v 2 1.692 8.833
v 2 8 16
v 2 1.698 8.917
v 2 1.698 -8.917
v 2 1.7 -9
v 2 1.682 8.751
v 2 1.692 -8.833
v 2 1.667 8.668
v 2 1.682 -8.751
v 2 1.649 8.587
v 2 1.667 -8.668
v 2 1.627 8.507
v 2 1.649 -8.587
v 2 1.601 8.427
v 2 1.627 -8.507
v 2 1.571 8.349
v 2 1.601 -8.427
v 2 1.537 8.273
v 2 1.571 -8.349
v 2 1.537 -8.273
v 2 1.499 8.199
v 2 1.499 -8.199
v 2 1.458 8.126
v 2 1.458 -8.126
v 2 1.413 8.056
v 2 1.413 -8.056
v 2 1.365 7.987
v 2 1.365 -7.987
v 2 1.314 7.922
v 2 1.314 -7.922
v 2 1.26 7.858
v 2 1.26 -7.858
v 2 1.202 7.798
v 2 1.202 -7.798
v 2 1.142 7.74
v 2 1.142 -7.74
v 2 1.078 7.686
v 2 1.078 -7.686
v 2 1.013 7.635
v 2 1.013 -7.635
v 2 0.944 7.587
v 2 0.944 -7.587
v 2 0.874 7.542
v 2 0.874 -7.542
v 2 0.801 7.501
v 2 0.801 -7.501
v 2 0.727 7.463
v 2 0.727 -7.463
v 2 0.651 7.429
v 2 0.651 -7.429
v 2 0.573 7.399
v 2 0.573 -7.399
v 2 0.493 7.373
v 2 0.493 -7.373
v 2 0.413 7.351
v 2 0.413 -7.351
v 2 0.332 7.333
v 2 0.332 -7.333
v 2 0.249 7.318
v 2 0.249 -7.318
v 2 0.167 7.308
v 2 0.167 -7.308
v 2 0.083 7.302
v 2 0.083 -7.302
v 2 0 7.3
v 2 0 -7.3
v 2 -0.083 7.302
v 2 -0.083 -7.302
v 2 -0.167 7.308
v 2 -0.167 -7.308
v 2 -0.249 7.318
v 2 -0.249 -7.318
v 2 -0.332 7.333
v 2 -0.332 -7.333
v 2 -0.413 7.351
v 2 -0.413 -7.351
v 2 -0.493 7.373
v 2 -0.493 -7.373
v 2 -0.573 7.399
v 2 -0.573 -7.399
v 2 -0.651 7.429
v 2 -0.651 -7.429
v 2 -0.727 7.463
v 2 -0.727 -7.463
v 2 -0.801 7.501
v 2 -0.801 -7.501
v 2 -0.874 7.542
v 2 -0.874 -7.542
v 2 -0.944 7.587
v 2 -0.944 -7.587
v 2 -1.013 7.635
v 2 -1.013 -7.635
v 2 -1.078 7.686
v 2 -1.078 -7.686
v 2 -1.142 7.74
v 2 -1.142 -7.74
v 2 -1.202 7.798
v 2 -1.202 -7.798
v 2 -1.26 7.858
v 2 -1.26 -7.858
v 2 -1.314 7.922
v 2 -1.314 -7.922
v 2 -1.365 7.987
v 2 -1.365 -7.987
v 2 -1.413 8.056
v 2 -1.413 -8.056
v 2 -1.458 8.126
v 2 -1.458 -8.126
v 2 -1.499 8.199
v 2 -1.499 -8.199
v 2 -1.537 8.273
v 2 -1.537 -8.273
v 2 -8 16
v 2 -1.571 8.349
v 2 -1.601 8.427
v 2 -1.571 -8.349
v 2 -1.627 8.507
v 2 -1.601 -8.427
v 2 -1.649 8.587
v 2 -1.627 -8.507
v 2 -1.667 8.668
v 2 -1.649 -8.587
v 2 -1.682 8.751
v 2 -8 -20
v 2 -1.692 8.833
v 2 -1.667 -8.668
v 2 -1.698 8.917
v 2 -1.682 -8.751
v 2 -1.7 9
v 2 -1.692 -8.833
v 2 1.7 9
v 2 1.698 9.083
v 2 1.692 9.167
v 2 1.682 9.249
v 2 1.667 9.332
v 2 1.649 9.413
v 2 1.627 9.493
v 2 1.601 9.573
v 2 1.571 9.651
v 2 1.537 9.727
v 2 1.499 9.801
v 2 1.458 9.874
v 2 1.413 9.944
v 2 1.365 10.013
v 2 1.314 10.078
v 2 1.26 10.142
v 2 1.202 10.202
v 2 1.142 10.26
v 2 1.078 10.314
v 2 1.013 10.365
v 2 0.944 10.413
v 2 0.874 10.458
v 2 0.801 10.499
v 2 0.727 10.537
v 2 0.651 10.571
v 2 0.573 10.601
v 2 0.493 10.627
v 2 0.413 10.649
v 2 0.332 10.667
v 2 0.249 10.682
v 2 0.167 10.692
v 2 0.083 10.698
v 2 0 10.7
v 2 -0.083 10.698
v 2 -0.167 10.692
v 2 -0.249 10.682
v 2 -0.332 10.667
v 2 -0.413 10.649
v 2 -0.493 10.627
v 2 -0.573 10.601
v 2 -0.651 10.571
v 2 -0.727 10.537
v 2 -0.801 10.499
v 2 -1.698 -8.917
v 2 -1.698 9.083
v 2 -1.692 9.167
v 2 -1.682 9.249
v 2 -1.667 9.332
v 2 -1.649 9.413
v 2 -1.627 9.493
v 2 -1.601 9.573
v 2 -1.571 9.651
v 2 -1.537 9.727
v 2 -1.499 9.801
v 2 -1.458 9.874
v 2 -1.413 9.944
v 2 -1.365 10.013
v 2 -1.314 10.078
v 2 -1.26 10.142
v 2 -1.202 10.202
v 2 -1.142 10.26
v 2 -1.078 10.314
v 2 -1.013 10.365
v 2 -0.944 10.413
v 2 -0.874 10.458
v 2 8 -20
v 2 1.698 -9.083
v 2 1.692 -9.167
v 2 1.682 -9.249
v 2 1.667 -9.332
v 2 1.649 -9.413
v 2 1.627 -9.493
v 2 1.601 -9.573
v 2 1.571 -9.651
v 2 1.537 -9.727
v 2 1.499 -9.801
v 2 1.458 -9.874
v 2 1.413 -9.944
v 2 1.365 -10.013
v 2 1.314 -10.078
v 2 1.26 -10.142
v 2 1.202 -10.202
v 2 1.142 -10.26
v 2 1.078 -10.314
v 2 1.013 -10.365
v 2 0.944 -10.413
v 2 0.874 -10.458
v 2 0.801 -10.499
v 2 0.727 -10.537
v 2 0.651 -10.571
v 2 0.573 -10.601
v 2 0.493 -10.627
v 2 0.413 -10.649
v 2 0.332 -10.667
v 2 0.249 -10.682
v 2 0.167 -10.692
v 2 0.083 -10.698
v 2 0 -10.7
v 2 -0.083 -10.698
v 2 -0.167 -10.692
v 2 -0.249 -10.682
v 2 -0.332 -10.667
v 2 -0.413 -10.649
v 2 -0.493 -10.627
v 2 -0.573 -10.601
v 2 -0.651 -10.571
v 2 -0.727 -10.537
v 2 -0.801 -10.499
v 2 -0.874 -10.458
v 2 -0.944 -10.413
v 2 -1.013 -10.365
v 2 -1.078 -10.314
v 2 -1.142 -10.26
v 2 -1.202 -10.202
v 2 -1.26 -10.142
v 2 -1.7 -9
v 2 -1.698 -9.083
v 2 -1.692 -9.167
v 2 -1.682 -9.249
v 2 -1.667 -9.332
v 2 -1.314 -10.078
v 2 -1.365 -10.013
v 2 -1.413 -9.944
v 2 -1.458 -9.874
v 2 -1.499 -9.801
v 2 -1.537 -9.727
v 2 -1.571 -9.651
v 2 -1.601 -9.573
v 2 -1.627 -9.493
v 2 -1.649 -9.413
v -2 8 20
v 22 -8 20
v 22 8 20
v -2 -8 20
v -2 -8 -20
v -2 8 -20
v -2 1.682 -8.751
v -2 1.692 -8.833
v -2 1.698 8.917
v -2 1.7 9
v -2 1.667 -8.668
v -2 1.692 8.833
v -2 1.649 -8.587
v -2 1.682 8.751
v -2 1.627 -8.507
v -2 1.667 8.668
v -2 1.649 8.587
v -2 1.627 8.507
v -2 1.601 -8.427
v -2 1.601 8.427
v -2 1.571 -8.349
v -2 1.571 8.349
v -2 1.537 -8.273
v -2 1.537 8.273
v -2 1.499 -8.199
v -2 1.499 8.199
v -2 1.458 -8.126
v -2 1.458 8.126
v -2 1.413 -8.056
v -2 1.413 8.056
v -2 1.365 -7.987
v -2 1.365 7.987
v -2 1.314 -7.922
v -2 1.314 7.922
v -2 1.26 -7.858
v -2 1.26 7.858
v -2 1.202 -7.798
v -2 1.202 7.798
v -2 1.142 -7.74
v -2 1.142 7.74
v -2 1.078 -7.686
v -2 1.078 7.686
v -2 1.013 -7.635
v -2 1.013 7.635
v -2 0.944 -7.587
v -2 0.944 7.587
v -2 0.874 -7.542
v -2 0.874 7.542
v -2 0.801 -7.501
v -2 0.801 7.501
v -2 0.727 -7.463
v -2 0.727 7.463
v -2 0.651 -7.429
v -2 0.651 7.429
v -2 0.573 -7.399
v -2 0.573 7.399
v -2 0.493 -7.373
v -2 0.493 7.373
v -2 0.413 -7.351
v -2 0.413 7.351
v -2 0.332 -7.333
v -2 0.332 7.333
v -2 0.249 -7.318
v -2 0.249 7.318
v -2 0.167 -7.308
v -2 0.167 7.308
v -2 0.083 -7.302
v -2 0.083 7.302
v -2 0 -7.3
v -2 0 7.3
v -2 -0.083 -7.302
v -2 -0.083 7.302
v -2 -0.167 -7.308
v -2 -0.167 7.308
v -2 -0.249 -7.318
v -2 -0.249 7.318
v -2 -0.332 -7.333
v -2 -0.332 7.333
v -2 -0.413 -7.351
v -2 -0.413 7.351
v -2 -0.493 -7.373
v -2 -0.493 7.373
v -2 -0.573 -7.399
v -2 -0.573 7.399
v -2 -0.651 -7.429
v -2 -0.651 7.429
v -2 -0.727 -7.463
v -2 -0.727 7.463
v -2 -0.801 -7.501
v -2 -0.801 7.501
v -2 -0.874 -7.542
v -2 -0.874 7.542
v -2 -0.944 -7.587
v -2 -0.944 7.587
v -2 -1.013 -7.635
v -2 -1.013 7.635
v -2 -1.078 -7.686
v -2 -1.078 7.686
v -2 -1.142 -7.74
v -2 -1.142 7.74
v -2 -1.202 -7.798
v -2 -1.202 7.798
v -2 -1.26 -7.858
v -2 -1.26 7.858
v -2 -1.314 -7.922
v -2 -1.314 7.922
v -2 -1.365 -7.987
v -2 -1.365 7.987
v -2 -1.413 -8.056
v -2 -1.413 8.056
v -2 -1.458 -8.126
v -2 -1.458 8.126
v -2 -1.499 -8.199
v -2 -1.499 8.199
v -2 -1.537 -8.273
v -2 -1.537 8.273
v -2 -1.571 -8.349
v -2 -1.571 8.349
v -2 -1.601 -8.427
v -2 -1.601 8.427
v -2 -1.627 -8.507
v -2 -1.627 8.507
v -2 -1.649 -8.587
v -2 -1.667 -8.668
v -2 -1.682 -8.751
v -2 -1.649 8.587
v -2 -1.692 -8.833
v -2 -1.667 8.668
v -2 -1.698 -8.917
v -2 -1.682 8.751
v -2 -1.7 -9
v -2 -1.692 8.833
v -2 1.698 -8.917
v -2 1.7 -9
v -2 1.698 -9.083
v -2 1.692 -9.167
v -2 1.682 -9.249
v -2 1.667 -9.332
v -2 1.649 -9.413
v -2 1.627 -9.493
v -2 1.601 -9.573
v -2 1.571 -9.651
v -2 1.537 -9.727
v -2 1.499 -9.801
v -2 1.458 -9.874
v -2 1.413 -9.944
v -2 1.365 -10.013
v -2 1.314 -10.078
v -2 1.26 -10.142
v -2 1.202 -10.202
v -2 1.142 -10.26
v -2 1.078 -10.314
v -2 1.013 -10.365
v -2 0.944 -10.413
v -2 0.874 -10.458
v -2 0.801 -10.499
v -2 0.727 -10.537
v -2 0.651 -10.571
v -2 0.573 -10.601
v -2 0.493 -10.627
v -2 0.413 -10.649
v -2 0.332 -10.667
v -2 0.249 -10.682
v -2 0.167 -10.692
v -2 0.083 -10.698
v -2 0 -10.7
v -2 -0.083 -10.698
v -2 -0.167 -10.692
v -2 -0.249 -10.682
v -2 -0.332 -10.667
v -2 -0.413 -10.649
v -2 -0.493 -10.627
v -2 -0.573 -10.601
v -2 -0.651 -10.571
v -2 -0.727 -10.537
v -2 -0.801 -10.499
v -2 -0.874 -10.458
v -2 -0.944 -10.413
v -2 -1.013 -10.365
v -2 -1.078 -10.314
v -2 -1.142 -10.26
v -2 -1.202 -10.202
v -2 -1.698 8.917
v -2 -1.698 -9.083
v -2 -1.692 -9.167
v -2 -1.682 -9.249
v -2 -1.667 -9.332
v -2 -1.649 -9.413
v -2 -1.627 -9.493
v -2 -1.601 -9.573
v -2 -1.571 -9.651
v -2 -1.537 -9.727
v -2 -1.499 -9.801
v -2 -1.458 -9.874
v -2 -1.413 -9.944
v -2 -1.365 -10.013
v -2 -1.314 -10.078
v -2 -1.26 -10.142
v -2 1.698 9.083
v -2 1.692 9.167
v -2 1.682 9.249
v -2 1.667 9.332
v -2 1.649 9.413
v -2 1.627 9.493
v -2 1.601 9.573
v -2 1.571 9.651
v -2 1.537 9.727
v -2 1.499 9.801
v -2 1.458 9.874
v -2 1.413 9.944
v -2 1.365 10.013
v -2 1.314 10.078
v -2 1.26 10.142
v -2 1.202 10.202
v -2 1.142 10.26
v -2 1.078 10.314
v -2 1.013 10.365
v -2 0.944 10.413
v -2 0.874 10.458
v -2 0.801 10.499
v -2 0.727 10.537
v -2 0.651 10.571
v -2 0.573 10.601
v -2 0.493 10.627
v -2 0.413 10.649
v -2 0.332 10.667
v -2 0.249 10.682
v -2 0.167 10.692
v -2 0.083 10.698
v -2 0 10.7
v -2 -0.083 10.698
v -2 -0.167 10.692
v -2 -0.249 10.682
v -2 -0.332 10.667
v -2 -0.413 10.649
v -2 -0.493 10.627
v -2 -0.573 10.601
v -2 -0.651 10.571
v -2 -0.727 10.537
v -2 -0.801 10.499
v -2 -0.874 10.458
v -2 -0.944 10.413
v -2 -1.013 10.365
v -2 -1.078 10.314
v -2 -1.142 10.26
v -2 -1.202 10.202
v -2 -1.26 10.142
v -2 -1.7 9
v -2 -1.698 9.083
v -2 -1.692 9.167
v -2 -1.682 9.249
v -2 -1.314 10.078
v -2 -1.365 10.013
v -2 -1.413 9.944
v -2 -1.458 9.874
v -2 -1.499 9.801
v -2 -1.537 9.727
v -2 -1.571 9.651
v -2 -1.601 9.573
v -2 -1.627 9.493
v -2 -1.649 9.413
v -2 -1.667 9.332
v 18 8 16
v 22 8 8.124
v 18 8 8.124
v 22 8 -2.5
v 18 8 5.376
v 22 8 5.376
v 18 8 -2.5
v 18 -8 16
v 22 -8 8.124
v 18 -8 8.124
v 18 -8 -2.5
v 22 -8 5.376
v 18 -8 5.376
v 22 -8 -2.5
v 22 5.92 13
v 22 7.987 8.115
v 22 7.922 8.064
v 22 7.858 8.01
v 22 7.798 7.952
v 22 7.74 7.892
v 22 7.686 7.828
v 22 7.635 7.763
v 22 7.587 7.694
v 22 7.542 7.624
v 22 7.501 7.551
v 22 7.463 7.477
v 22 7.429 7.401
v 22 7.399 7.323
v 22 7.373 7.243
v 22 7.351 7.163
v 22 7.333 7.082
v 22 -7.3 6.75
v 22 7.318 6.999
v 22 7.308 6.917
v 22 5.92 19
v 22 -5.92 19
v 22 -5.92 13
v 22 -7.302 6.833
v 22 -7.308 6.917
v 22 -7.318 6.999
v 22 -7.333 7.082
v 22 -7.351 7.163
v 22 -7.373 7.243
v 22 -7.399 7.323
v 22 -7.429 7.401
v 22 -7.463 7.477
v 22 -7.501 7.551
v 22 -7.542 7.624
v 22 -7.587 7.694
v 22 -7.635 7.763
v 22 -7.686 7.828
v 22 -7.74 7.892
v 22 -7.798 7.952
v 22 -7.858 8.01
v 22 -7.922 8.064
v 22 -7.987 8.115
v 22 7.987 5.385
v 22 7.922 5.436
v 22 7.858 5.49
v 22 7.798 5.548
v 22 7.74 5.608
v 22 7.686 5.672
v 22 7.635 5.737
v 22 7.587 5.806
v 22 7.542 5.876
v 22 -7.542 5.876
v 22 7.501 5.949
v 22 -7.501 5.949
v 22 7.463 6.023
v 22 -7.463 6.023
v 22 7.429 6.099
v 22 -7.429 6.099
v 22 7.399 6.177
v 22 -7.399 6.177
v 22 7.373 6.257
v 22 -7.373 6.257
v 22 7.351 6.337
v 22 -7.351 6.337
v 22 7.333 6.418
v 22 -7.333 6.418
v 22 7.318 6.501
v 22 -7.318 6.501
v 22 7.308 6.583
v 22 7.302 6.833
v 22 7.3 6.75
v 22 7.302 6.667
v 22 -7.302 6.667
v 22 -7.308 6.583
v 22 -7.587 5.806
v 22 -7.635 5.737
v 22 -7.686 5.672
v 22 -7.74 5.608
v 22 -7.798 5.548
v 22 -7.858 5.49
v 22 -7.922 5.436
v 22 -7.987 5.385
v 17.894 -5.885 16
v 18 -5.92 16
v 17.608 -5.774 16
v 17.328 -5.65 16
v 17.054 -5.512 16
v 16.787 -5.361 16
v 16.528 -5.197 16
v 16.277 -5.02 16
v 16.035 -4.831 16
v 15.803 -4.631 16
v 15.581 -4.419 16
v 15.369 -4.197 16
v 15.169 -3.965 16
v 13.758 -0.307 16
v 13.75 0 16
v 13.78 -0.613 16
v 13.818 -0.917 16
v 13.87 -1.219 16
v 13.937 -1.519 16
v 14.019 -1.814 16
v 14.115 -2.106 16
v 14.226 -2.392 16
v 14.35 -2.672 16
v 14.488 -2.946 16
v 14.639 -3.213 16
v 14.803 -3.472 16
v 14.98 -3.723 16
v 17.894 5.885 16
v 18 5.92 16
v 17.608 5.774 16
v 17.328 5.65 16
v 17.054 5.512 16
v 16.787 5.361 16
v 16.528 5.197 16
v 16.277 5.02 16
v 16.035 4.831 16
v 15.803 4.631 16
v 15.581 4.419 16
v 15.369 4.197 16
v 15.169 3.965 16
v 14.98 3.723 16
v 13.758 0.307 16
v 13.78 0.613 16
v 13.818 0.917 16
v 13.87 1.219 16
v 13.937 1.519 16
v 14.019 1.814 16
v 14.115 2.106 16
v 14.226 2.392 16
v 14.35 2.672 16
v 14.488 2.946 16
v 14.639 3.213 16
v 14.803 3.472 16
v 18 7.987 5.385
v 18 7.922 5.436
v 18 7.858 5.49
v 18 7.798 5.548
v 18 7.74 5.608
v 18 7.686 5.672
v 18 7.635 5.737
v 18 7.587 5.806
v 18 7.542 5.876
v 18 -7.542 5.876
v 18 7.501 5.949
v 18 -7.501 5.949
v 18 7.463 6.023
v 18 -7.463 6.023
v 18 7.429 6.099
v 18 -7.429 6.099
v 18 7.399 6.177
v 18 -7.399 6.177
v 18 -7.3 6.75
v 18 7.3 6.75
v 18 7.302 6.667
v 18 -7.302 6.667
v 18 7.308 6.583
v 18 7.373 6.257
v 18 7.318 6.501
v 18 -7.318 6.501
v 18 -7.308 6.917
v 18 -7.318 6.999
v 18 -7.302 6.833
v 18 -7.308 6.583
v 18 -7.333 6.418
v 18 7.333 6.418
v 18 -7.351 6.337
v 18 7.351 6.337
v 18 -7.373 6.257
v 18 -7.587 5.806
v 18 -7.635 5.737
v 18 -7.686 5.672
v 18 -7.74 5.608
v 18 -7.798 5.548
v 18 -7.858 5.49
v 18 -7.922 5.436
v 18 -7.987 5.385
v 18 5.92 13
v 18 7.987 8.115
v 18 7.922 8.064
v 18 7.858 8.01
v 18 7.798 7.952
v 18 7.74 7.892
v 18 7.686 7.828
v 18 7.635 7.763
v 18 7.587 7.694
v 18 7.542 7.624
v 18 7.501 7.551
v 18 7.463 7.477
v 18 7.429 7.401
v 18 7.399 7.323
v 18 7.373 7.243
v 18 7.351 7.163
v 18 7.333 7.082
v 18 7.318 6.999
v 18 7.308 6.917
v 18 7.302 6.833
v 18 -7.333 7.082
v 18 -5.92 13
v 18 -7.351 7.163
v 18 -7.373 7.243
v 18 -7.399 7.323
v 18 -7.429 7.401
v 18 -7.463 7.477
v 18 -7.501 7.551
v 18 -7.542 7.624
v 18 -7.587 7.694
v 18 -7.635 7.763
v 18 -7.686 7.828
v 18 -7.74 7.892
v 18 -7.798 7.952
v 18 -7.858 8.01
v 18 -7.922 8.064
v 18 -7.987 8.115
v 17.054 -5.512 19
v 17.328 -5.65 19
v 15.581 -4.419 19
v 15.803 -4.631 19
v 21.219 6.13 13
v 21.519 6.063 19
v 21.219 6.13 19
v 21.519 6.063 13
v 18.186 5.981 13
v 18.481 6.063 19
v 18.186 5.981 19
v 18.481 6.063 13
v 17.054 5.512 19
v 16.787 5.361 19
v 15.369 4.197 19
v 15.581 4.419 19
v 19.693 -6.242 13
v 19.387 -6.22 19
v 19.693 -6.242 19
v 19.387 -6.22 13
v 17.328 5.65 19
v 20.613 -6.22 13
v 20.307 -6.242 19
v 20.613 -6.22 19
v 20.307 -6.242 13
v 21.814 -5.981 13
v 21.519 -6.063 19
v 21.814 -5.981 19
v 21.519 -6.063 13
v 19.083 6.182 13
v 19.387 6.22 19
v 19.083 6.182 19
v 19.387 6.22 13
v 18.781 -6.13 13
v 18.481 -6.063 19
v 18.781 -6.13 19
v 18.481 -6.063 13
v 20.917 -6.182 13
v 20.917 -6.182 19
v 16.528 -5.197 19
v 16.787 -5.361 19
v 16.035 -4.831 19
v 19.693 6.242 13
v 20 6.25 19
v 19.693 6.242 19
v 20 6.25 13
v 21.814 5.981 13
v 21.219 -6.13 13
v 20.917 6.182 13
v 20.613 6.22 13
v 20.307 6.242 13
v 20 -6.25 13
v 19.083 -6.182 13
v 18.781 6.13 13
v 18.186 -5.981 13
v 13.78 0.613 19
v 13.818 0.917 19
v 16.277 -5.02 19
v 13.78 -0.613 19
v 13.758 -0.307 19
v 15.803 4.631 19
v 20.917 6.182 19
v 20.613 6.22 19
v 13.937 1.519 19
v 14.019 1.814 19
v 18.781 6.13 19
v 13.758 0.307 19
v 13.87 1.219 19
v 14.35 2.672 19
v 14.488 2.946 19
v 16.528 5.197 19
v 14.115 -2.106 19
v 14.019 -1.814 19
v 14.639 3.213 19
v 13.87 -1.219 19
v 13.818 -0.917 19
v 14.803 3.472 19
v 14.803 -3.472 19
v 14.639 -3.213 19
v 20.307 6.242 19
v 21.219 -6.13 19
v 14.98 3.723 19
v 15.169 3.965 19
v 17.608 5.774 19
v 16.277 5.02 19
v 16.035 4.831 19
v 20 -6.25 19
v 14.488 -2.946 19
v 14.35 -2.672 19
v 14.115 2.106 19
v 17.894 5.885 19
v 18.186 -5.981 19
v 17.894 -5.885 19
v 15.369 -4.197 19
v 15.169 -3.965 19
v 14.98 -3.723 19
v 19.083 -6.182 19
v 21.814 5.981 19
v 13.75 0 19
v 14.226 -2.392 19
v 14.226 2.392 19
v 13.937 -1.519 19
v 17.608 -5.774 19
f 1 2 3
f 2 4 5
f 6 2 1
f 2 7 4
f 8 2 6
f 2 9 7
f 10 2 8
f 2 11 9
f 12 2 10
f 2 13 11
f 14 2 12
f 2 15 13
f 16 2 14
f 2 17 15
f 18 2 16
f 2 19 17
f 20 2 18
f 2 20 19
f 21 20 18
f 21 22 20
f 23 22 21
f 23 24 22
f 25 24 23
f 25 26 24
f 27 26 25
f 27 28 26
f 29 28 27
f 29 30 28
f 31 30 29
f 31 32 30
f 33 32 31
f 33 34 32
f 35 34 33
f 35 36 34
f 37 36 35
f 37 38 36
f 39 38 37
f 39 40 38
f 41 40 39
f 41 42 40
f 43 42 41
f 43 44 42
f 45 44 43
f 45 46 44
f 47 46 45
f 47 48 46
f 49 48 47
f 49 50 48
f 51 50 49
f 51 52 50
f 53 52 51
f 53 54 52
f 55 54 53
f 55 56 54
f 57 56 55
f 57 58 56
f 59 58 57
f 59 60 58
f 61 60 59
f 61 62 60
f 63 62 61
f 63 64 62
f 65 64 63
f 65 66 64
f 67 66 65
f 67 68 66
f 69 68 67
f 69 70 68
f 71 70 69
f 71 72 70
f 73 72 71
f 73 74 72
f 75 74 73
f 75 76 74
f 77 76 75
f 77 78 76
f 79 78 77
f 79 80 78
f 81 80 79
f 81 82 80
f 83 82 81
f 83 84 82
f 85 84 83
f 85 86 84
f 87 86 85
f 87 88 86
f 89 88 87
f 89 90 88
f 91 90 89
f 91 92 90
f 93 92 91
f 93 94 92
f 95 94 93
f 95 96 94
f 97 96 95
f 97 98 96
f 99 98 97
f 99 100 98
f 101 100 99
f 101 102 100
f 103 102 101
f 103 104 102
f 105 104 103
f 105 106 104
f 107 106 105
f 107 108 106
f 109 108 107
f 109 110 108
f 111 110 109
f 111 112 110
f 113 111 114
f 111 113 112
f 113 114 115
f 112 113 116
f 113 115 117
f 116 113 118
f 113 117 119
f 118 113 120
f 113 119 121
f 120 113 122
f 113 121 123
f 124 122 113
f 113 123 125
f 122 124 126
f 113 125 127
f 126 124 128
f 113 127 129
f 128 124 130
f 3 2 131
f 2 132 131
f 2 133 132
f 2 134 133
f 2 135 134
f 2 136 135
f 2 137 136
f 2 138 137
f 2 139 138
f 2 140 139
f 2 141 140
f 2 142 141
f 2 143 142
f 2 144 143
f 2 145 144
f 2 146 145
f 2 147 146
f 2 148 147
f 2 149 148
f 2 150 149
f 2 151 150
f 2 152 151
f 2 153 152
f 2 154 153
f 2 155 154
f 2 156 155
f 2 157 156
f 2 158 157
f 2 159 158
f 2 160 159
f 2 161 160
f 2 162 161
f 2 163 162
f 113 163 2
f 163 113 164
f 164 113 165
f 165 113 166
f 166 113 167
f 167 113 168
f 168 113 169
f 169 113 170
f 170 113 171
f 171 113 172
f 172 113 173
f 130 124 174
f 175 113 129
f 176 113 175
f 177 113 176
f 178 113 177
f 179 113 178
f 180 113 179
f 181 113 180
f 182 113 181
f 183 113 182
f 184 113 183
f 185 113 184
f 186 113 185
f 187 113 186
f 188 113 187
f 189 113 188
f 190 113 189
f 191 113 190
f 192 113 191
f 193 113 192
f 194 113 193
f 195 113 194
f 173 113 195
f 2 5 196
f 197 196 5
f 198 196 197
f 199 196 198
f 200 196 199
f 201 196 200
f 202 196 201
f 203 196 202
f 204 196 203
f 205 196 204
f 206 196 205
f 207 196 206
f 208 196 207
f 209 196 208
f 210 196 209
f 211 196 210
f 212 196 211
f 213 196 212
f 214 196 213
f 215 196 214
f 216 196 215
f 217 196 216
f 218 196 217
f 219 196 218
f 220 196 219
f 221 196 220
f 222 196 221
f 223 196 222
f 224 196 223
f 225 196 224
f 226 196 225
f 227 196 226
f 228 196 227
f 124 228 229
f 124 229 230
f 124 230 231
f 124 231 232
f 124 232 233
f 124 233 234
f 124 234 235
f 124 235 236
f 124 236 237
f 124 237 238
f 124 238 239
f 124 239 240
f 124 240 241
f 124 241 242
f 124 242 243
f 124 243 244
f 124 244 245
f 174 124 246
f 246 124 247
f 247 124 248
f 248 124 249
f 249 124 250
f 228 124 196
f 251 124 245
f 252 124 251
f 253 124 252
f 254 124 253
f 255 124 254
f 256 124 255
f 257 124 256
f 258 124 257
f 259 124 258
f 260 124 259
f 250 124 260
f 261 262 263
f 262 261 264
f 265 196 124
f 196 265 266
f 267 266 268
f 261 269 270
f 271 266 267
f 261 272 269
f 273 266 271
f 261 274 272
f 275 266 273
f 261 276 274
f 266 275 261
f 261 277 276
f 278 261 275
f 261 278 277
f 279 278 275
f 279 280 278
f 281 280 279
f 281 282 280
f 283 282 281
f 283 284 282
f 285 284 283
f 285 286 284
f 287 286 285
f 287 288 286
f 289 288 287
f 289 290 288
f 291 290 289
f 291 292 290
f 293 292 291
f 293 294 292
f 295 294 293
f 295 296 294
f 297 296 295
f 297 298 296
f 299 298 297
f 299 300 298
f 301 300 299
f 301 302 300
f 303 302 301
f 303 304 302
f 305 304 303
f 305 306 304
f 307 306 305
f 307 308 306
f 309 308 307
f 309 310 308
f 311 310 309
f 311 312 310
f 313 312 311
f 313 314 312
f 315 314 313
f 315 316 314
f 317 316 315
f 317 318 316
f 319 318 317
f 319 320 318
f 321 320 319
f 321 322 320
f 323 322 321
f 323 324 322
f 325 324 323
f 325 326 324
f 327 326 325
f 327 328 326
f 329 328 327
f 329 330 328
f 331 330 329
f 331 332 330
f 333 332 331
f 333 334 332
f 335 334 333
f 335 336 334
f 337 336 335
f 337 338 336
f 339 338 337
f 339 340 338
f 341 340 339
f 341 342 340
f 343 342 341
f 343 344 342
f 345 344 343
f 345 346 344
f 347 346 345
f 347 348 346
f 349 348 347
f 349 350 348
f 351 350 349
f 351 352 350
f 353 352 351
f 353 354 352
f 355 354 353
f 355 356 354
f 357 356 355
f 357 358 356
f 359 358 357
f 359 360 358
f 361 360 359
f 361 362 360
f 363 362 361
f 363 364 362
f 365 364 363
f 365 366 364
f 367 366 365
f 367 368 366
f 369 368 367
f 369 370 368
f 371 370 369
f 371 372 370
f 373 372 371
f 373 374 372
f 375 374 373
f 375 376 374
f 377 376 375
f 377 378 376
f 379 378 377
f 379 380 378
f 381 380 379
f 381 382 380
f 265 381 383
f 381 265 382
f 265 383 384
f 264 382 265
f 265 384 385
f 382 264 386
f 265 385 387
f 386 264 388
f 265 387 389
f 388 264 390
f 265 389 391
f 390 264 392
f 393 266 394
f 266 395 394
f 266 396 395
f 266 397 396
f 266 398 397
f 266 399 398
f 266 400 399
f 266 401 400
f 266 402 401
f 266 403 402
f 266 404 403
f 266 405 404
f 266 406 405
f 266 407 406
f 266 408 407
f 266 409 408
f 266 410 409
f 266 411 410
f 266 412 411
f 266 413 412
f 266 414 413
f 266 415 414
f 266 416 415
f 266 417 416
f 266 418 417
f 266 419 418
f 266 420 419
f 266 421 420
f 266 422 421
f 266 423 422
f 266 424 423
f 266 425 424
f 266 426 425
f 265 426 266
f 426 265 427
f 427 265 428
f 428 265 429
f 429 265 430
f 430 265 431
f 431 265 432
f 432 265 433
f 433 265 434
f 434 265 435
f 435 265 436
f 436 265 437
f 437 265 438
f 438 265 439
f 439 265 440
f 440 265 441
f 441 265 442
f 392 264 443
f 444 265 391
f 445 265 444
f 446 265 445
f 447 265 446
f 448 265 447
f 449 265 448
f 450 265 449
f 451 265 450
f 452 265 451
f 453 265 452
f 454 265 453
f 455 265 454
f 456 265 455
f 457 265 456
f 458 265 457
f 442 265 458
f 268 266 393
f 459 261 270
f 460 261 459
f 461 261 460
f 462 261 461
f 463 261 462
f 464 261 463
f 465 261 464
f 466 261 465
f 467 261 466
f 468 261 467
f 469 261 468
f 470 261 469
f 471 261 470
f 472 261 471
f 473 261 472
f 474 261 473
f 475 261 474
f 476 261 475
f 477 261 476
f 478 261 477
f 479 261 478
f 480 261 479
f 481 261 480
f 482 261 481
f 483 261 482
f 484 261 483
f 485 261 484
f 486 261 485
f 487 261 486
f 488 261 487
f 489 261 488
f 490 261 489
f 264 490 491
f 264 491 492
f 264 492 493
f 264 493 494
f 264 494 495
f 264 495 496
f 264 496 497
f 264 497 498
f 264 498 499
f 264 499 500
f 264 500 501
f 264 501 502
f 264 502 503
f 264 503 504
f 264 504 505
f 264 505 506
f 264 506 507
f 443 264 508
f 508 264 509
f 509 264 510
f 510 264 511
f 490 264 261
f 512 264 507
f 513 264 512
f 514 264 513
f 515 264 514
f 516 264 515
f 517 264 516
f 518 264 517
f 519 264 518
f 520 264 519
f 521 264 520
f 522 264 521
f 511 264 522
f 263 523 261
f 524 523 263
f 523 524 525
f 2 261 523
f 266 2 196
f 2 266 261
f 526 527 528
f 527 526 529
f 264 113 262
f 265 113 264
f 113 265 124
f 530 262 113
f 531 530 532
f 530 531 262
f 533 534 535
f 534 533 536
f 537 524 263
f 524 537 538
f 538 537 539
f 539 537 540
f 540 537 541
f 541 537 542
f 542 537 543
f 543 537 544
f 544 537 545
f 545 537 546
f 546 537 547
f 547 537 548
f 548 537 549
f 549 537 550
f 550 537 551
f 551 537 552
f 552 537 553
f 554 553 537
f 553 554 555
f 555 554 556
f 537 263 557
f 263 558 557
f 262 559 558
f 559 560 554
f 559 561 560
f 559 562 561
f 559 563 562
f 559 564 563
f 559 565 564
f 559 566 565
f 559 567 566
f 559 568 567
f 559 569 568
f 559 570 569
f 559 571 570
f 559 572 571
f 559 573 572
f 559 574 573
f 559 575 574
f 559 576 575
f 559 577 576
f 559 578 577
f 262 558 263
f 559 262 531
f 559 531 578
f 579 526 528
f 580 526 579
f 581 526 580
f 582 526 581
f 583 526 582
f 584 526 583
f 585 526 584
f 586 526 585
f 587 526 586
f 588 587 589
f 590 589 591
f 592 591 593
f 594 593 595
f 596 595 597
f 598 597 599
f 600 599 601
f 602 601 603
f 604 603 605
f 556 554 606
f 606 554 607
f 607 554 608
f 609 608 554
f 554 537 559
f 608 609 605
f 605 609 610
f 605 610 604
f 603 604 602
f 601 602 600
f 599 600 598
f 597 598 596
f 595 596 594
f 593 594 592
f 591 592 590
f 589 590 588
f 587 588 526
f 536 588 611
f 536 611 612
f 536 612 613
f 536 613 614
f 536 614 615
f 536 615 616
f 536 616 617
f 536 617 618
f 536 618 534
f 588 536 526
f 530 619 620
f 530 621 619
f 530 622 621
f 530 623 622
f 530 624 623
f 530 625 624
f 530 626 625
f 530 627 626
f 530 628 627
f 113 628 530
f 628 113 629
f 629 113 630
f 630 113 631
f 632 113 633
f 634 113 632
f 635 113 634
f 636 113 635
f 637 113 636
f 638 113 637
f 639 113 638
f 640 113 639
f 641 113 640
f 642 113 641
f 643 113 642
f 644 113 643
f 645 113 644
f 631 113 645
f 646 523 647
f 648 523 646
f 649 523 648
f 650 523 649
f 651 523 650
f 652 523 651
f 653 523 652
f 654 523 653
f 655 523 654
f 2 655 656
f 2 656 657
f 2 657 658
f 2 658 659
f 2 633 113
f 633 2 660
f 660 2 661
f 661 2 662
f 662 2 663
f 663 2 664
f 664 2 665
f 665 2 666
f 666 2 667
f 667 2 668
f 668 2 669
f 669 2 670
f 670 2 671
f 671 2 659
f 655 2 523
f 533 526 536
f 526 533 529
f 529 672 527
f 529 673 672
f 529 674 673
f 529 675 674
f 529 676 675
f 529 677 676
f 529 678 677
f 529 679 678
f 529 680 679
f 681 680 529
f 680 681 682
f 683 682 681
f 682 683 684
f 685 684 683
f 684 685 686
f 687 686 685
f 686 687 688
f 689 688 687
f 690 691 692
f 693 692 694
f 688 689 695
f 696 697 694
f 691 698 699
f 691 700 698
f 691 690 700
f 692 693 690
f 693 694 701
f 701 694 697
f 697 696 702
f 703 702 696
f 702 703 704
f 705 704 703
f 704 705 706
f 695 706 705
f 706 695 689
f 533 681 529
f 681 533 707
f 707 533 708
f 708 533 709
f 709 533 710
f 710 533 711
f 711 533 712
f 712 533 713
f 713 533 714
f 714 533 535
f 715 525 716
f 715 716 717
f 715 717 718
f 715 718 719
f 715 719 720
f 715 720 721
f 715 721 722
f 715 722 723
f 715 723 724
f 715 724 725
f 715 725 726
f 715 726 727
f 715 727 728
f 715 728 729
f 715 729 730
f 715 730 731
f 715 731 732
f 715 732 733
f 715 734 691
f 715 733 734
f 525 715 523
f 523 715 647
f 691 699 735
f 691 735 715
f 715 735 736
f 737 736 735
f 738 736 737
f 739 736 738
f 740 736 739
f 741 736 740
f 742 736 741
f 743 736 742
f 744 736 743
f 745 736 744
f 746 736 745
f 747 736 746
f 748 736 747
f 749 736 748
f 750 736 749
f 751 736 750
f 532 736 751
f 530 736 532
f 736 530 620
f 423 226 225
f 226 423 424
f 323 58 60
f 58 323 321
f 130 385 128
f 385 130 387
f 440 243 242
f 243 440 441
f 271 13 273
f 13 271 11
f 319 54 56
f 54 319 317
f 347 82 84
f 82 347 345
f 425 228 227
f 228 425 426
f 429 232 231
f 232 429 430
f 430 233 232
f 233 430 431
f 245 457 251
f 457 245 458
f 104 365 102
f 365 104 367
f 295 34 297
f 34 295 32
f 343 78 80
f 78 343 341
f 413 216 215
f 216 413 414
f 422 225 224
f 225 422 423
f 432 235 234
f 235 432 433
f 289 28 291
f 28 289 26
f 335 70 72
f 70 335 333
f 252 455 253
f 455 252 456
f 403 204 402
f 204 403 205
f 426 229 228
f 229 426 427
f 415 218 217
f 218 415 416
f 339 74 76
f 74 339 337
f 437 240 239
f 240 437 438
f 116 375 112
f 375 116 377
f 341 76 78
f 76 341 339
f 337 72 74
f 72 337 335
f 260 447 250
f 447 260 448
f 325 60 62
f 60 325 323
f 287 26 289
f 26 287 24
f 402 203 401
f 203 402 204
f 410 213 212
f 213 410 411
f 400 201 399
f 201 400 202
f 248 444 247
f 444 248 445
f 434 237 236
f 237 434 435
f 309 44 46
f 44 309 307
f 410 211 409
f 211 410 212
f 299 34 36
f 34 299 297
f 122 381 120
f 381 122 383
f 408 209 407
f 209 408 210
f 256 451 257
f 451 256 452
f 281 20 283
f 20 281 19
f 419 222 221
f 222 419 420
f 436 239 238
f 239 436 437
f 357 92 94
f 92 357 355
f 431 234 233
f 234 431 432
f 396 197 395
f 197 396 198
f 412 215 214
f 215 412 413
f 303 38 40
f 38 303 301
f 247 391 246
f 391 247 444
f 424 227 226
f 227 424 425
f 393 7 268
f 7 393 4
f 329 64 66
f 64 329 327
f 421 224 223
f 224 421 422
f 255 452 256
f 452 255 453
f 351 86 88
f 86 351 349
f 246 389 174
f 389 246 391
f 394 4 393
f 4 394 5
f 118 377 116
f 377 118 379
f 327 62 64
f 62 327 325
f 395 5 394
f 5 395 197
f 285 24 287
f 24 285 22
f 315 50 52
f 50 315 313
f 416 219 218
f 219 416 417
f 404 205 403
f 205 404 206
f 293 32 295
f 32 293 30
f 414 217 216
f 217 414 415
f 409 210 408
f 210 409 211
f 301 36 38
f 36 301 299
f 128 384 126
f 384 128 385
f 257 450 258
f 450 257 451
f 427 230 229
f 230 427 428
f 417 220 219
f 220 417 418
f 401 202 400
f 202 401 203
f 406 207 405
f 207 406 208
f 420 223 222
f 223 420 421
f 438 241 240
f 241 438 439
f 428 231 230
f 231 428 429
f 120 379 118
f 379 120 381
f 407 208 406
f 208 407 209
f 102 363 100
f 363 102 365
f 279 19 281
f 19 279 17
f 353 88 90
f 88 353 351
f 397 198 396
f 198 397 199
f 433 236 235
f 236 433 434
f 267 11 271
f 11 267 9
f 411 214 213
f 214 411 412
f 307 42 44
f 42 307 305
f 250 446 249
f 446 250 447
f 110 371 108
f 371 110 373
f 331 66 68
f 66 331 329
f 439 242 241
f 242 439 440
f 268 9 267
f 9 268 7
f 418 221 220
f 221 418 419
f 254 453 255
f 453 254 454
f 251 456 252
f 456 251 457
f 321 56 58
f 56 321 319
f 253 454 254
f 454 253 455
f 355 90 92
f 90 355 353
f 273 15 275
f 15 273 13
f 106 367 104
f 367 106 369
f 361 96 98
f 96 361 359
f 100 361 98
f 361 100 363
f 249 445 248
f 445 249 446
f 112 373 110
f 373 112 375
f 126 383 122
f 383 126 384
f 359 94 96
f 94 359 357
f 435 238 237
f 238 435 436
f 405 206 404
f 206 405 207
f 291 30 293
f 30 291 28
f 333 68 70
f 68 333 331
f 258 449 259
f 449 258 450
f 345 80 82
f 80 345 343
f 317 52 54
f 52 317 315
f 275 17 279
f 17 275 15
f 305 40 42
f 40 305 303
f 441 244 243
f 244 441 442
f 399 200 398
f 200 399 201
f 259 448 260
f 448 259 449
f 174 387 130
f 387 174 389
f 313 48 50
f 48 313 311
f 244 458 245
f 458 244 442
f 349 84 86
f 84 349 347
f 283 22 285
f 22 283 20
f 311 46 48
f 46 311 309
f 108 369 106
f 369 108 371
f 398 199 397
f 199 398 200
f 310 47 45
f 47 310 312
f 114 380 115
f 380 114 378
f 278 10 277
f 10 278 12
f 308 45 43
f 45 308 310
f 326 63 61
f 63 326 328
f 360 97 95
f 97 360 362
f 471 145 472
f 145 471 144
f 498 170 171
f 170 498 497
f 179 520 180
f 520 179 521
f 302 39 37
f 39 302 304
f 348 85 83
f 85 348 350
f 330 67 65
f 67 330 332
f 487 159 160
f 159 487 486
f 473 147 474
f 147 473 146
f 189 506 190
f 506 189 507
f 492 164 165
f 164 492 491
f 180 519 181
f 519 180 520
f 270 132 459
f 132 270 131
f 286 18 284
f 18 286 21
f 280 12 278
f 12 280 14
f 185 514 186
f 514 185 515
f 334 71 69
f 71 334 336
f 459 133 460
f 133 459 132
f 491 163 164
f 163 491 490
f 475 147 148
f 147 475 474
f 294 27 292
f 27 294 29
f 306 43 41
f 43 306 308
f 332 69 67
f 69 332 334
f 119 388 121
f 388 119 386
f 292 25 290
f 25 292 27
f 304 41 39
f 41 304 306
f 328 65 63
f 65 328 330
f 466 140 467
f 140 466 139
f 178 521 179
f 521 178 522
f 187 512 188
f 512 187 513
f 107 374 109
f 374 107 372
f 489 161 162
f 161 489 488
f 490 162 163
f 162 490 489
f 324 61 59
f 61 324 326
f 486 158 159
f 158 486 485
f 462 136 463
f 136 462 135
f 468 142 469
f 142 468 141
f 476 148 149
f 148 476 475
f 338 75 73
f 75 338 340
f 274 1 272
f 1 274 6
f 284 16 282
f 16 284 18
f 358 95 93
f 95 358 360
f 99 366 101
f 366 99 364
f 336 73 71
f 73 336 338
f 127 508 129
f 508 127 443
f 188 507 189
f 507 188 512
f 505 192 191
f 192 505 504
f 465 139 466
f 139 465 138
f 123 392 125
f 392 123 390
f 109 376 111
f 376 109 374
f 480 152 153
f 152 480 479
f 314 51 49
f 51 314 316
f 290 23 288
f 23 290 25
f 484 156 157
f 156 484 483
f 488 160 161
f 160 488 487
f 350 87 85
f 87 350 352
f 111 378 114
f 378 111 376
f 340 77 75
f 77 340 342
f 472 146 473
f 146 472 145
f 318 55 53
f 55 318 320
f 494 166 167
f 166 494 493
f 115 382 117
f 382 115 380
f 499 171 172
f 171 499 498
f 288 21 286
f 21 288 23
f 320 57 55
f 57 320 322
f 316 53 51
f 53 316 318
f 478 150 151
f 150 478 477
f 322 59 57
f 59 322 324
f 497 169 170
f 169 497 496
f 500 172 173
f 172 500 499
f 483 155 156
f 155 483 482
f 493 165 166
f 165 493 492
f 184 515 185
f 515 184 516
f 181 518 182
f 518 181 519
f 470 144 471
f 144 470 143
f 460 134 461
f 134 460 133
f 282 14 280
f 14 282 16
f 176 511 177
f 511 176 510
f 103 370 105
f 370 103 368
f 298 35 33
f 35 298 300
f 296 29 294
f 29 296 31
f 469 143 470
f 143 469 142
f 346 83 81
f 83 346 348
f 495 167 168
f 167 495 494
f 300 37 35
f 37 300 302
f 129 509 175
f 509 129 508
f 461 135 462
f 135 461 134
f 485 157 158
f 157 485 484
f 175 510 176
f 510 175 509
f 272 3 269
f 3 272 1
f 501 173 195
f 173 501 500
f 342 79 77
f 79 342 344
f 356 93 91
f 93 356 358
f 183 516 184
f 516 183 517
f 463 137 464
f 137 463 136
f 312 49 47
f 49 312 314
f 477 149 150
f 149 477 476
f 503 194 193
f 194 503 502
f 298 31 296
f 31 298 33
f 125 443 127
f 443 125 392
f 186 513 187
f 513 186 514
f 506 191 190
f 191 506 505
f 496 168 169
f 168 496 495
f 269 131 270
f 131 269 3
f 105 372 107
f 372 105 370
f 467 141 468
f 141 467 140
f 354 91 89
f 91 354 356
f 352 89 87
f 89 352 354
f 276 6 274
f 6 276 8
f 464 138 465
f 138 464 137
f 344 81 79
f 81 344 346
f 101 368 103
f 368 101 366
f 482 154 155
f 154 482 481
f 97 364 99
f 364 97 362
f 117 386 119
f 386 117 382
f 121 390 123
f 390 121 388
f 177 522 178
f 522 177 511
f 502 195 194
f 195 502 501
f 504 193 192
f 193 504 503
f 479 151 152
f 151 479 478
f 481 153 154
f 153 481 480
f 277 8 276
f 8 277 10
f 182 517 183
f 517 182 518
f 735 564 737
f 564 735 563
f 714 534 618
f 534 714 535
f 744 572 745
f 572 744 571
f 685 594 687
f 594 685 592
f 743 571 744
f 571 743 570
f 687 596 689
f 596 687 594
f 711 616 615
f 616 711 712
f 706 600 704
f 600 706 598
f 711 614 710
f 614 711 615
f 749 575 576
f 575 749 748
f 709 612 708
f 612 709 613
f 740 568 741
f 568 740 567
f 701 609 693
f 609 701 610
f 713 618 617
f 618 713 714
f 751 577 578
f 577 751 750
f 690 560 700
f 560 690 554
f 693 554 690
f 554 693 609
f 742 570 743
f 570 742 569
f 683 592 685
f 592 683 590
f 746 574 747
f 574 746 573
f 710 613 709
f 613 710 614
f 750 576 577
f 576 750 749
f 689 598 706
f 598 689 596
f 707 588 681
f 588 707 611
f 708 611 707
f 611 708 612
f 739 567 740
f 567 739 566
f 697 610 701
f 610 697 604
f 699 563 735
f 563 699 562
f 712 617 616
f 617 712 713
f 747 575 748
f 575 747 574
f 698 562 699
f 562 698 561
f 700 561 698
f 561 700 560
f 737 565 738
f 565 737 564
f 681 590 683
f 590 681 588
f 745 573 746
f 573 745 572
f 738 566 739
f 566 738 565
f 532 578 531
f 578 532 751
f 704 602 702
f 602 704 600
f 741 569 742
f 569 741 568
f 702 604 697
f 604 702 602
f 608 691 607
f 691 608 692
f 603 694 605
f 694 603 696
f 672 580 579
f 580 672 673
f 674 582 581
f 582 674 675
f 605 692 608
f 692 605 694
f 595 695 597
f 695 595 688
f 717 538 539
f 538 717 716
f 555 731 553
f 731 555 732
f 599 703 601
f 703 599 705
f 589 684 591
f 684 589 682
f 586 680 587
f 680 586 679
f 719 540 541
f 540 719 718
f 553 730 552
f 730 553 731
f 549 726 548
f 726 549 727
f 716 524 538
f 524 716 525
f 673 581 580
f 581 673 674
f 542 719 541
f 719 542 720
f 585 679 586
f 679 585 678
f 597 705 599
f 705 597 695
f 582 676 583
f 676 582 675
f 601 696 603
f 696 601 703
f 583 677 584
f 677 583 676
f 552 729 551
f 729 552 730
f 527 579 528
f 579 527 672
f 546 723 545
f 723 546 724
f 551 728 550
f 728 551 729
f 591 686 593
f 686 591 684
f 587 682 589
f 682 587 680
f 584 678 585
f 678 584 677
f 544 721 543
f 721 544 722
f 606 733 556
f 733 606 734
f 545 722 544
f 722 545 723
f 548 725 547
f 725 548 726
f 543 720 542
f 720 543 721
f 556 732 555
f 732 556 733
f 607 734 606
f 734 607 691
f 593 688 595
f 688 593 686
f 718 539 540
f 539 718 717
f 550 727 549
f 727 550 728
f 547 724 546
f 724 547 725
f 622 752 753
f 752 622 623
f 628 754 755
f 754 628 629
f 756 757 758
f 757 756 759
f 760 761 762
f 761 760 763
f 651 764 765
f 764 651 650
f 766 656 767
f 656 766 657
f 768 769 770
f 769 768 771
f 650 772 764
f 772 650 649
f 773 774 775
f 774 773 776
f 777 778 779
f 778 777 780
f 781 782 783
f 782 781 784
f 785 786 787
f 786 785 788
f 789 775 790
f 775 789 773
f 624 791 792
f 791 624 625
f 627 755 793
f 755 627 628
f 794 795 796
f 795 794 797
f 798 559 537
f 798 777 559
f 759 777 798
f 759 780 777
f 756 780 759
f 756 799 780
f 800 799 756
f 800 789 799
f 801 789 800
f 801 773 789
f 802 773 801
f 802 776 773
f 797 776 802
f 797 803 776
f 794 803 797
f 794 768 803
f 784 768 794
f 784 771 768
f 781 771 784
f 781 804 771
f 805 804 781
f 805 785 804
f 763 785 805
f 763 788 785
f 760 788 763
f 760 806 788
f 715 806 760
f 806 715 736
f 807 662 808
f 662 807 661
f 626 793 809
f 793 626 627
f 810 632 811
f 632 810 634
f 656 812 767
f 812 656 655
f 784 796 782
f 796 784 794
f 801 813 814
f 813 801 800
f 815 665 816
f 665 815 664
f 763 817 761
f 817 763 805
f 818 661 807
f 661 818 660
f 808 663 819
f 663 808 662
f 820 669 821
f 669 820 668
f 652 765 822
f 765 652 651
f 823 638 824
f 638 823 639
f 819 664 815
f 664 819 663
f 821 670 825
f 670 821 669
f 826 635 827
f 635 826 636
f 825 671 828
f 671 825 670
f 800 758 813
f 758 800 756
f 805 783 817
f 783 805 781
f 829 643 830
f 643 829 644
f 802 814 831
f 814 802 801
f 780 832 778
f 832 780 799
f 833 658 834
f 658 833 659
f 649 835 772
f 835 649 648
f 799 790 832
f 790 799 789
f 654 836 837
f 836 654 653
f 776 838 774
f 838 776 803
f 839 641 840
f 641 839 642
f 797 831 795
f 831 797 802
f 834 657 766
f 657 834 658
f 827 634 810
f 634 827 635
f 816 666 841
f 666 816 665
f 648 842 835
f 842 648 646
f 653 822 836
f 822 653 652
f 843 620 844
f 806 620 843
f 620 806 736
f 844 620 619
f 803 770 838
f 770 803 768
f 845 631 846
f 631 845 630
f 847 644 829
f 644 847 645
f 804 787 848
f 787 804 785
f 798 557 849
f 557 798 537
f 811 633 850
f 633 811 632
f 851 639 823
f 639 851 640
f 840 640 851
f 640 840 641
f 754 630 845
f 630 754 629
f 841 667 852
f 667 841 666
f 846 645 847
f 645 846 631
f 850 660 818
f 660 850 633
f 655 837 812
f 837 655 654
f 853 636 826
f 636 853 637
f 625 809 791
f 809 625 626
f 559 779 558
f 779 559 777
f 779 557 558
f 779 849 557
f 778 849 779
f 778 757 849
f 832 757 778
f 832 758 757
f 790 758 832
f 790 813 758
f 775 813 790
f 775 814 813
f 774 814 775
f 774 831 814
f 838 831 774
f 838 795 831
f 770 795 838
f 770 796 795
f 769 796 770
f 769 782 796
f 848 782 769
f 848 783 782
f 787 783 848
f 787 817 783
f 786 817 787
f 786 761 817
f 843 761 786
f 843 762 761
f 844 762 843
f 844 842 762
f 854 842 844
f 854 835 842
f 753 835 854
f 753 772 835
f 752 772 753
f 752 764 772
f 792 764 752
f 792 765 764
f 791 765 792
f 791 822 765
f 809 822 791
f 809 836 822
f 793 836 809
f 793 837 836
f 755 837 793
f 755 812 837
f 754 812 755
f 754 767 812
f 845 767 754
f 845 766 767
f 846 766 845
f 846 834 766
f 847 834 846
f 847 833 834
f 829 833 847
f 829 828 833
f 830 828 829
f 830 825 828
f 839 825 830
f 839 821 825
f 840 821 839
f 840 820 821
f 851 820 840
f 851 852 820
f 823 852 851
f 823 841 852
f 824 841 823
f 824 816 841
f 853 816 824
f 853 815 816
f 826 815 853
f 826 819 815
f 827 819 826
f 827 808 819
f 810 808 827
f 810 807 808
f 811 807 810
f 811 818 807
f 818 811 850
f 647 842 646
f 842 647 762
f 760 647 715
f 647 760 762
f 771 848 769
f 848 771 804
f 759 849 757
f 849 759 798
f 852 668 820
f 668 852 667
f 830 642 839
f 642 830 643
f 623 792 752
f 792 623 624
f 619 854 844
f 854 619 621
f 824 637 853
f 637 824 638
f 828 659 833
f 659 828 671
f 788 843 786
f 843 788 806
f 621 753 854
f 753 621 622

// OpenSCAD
// file: ../lib/fasteners.scad
// Fastener Library - Standard metric hole profiles
// Usage: include <lib/fasteners.scad>

/* --- Tolerances --- */
hole_clearance = 0.2;  // added to nominal diameter for clearance holes
insert_clearance = 0.1; // for heat-set insert cavities

/* --- M3 --- */
module m3_clearance_hole(depth=10) {
    cylinder(d=3.4, h=depth, center=false);
}

module m3_counterbore(depth=10, head_depth=3.2) {
    union() {
        cylinder(d=3.4, h=depth, center=false);
        cylinder(d=6.5, h=head_depth, center=false);
    }
}

module m3_countersink(depth=10) {
    union() {
        cylinder(d=3.4, h=depth, center=false);
        cylinder(d1=6.8, d2=3.4, h=2.0, center=false);
    }
}

module m3_heat_insert_cavity(depth=5.5) {
    // For M3 x 5mm brass heat-set inserts (typical OD ~4.6mm)
    cylinder(d=4.8, h=depth, center=false);
}

module m3_nut_trap(depth=2.6) {
    // M3 hex nut: 5.5mm across flats, 2.4mm thick
    cylinder(d=6.2, h=depth, $fn=6, center=false);
}

/* --- M4 --- */
module m4_clearance_hole(depth=10) {
    cylinder(d=4.5, h=depth, center=false);
}

module m4_counterbore(depth=10, head_depth=4.2) {
    union() {
        cylinder(d=4.5, h=depth, center=false);
        cylinder(d=8.0, h=head_depth, center=false);
    }
}

module m4_heat_insert_cavity(depth=7.0) {
    // For M4 x 6mm brass heat-set inserts (typical OD ~6.0mm)
    cylinder(d=6.2, h=depth, center=false);
}

module m4_nut_trap(depth=3.4) {
    // M4 hex nut: 7.0mm across flats, 3.2mm thick
    cylinder(d=7.7, h=depth, $fn=6, center=false);
}

/* --- M5 --- */
module m5_clearance_hole(depth=10) {
    cylinder(d=5.5, h=depth, center=false);
}

module m5_counterbore(depth=10, head_depth=5.2) {
    union() {
        cylinder(d=5.5, h=depth, center=false);
        cylinder(d=9.5, h=head_depth, center=false);
    }
}

module m5_nut_trap(depth=4.4) {
    // M5 hex nut: 8.0mm across flats, 4.0mm thick
    cylinder(d=8.8, h=depth, $fn=6, center=false);
}
// main file
// Part: X-Carriage Probe Adapter - BLTouch
// Version: v1
// Process: 3D Print - PLA Black - Standard profile
// Description: Adapter bracket to mount BLTouch on hotend plate probe slot

include <../lib/fasteners.scad>

/* --- Parameters --- */

// BLTouch dimensions
bltouch_body_width = 11.5;
bltouch_body_depth = 13;
bltouch_body_height = 37;   // including pin stroke
bltouch_mount_spacing = 18; // M3 holes center-to-center
bltouch_mount_bolt = 3;

// Nozzle offset (BLTouch probe tip relative to nozzle)
// X-offset depends on mounting side; adjust for your setup
probe_x_offset = 30;        // mm to the right of nozzle center
probe_y_offset = 0;         // in line with nozzle (Y)

// Interface to hotend plate (2x M3 on right side, 18mm spacing)
plate_bolt_spacing = 18;
plate_bolt_size = 3;

// Bracket dimensions
bracket_width = 16;
bracket_height = 40;
bracket_thickness = 4;
arm_length = 20;            // horizontal reach from plate to BLTouch center

/* --- Resolution --- */
$fn = $preview ? 32 : 128;

/* --- Modules --- */

module bltouch_adapter() {
    difference() {
        union() {
            // Vertical mounting face (bolts to hotend plate)
            translate([0, 0, 0])
                cube([bracket_thickness, bracket_width, bracket_height], center = true);

            // Horizontal arm extending to BLTouch position
            translate([arm_length/2, 0, bracket_height/2 - bracket_thickness/2])
                cube([arm_length + bracket_thickness, bracket_width, bracket_thickness], center = true);

            // BLTouch vertical mount tab (at end of arm)
            translate([arm_length, 0, bracket_height/2 - bracket_thickness - bltouch_body_height/4])
                cube([bracket_thickness, bracket_width, bltouch_body_height/2], center = true);
        }

        // Plate mounting holes (2x M3 vertical on mounting face)
        translate([0, 0, 0]) {
            translate([0, 0, -plate_bolt_spacing/2])
                rotate([0, 90, 0])
                    cylinder(d = 3.4, h = bracket_thickness + 2, center = true);
            translate([0, 0,  plate_bolt_spacing/2])
                rotate([0, 90, 0])
                    cylinder(d = 3.4, h = bracket_thickness + 2, center = true);
        }

        // BLTouch mounting holes (2x M3, 18mm spacing, on vertical end tab)
        translate([arm_length, 0, bracket_height/2 - bracket_thickness - bltouch_body_height/4]) {
            translate([0, -bltouch_mount_spacing/2, 0])
                rotate([0, 90, 0])
                    cylinder(d = 3.4, h = bracket_thickness + 2, center = true);
            translate([0,  bltouch_mount_spacing/2, 0])
                rotate([0, 90, 0])
                    cylinder(d = 3.4, h = bracket_thickness + 2, center = true);
        }

        // BLTouch body clearance hole (pin needs to extend below)
        translate([arm_length, 0, bracket_height/2 - bracket_thickness])
            cylinder(d = bltouch_body_width + 1, h = bracket_thickness + 2, center = true);
    }
}

/* --- Render --- */
bltouch_adapter();
